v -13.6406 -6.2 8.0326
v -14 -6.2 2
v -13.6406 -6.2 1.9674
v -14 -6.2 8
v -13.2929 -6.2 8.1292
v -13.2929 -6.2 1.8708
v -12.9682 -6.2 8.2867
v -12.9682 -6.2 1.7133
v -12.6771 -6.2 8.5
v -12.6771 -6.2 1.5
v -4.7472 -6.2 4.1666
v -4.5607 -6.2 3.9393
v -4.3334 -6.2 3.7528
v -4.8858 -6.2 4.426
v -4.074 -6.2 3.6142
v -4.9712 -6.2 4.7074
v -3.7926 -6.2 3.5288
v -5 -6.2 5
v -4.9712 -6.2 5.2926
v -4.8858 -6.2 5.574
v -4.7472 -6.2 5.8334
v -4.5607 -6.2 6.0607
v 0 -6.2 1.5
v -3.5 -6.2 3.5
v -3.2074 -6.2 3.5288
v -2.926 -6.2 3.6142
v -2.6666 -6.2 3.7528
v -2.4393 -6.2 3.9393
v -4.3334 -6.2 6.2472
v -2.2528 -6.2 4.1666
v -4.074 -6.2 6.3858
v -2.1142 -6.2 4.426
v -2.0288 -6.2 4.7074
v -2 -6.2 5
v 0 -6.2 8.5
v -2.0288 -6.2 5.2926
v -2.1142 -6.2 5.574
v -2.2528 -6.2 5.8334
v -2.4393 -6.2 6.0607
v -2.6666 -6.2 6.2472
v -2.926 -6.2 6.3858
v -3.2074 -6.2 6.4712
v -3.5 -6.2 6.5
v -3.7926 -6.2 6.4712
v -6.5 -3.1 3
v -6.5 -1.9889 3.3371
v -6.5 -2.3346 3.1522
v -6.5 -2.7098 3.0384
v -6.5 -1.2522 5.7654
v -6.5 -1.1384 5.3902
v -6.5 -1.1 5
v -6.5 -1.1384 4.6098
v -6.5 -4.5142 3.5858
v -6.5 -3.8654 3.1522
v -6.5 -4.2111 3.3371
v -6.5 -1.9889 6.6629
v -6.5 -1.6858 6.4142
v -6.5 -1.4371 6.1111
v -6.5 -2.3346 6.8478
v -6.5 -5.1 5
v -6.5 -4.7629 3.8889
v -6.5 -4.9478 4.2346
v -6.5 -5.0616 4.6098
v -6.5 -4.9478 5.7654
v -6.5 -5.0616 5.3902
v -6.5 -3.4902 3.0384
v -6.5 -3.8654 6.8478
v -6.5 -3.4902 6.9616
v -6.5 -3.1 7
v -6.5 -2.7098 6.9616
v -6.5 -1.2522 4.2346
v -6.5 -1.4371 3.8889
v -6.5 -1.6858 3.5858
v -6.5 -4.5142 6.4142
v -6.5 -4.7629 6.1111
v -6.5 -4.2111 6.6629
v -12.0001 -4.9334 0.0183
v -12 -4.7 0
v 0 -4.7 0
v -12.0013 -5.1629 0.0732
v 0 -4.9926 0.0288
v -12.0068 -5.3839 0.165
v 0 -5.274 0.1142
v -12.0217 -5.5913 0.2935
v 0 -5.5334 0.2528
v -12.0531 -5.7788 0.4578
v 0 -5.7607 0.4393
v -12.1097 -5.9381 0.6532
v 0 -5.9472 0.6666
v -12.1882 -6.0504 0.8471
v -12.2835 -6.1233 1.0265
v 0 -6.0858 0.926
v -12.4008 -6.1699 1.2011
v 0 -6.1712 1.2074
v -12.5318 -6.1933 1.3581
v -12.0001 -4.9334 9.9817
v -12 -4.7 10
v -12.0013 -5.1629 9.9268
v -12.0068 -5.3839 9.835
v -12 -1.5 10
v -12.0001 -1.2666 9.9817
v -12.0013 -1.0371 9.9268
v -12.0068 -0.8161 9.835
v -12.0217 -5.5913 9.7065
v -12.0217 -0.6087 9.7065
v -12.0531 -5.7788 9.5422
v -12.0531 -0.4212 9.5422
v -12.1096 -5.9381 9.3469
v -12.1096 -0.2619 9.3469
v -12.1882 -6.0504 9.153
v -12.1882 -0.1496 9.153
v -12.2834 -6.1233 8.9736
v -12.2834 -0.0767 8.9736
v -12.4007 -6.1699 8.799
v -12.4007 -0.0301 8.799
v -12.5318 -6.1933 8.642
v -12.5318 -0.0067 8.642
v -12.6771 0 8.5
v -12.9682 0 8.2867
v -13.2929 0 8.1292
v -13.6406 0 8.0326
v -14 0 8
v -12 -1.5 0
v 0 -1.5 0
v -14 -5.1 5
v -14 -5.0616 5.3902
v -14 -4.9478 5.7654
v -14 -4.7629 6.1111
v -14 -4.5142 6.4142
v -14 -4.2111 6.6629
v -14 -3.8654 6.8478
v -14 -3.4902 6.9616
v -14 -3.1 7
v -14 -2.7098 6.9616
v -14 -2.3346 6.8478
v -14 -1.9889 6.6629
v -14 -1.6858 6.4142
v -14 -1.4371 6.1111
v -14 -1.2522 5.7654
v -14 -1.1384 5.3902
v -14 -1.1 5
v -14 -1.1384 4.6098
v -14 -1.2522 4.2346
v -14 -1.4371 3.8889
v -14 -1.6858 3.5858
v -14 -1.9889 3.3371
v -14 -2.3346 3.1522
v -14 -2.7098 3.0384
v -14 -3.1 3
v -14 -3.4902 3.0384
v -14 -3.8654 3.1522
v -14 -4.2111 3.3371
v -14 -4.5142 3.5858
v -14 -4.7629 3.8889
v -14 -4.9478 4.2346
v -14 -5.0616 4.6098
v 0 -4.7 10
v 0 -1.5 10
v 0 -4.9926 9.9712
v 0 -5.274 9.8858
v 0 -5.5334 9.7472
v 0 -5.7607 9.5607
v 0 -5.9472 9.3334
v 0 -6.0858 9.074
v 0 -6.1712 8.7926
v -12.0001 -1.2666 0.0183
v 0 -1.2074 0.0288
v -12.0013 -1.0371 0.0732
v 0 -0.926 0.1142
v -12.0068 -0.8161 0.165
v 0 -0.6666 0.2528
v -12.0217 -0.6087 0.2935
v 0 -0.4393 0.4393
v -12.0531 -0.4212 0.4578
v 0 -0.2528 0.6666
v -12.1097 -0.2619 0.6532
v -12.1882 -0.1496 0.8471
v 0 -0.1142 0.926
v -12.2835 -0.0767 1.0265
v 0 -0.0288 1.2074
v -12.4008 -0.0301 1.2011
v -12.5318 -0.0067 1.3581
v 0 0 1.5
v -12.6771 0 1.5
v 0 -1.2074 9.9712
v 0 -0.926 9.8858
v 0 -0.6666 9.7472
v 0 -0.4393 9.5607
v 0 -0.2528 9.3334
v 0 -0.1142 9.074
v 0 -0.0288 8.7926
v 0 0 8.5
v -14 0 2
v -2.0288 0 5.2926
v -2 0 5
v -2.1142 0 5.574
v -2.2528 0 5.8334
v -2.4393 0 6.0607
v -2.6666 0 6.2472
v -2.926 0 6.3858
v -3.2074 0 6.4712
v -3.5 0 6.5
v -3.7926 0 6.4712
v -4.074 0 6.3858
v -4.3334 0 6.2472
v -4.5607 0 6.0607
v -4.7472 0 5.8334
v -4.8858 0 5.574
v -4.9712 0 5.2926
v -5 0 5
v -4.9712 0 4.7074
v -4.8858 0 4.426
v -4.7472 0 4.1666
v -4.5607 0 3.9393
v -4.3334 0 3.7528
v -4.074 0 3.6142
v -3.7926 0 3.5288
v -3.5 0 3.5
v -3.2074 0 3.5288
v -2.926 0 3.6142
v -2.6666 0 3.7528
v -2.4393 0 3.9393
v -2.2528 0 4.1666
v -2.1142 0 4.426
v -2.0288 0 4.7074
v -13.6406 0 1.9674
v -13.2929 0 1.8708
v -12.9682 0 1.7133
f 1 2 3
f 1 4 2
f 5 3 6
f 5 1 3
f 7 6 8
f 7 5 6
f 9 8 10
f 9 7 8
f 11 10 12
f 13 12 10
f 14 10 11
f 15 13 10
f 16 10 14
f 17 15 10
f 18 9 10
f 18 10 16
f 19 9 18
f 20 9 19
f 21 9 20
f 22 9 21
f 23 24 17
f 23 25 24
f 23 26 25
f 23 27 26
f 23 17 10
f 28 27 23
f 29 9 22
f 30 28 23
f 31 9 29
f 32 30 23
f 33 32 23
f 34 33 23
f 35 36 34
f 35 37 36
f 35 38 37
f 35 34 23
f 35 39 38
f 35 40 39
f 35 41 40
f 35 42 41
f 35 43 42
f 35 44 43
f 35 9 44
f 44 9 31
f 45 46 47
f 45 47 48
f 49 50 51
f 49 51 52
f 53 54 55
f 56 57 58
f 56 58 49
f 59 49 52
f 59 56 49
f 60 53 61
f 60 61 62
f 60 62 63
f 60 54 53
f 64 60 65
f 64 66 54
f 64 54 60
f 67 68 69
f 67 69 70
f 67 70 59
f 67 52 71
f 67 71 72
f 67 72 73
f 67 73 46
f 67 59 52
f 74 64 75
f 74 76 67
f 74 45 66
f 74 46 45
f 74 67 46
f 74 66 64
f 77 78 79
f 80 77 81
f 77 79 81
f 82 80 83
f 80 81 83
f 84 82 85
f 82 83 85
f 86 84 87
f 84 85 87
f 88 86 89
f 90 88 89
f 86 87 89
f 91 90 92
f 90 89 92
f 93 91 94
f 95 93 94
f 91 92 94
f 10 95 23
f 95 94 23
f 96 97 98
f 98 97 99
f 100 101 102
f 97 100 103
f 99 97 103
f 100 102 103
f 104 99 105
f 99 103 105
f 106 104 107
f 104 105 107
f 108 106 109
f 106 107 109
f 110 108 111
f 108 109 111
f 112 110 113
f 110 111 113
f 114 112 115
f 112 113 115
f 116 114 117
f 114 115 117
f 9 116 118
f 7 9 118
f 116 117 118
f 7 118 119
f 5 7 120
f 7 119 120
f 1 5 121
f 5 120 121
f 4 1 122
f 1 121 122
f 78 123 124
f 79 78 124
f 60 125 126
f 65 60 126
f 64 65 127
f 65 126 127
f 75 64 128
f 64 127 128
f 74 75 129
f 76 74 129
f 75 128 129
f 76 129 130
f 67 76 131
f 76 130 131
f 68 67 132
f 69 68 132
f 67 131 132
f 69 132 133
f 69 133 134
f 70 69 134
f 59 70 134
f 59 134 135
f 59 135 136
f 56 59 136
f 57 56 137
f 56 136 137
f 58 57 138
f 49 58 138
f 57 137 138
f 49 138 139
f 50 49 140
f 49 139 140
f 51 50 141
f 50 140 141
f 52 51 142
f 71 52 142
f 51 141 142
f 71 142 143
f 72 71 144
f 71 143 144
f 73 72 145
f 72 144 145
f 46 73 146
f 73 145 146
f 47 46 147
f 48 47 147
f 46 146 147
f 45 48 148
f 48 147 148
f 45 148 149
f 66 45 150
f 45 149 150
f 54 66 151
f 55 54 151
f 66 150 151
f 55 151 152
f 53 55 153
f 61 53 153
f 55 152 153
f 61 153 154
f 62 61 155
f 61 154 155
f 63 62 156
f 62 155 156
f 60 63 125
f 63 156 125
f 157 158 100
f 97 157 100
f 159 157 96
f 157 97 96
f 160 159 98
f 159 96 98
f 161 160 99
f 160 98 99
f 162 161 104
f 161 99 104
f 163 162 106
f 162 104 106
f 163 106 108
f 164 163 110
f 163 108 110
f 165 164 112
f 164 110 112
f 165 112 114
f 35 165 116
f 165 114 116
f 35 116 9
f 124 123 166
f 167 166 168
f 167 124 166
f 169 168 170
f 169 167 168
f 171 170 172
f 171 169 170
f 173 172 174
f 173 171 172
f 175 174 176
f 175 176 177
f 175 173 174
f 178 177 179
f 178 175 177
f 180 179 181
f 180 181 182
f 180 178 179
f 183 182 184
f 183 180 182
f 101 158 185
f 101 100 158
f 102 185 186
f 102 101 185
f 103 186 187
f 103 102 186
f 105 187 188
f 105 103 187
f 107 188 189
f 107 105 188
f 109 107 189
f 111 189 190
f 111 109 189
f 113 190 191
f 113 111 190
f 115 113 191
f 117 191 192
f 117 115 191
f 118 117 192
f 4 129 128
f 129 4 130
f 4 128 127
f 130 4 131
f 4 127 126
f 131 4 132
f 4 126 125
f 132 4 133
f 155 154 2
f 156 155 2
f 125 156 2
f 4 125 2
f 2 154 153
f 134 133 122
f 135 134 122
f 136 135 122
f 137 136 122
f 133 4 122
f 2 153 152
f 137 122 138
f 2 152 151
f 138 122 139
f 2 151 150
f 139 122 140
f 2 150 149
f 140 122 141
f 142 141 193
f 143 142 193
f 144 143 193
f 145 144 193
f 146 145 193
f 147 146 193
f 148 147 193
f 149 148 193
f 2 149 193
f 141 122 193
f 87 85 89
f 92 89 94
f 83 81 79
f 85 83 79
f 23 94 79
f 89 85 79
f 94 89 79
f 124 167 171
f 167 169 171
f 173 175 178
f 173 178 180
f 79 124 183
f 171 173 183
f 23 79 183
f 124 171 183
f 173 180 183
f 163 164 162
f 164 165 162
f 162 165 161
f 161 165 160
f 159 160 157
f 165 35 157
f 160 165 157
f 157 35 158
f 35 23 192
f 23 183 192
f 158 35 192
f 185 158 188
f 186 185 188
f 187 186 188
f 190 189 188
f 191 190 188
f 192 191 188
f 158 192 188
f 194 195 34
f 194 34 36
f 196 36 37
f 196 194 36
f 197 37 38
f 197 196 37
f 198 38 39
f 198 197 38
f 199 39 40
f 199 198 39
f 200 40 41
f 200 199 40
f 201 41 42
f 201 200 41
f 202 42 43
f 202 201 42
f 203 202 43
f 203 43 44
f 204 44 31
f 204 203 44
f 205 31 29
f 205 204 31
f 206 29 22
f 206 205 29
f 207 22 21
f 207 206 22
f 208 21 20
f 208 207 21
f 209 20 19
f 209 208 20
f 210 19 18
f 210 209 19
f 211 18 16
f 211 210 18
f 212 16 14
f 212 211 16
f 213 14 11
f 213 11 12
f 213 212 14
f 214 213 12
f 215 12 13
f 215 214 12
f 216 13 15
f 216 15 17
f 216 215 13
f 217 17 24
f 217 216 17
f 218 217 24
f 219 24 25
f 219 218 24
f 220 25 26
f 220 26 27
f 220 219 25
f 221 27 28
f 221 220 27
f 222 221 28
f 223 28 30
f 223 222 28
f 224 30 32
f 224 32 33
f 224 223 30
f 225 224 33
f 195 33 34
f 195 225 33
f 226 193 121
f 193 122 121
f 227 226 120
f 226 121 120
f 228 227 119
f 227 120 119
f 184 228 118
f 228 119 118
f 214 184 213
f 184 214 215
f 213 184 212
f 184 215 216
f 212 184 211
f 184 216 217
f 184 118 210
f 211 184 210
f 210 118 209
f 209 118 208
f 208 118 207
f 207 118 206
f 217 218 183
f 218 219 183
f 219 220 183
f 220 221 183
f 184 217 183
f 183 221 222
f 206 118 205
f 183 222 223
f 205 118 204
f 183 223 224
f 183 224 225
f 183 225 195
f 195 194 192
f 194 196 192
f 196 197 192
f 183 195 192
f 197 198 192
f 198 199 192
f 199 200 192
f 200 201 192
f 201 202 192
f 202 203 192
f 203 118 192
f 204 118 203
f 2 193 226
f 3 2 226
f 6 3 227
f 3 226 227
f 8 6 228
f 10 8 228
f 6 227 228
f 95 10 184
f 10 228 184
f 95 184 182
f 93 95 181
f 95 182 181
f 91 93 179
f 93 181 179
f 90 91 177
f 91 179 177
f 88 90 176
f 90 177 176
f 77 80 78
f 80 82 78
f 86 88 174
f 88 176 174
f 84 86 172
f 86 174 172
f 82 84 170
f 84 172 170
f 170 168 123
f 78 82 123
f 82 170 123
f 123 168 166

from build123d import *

# Parameters (mm, degrees)
F0_R     = 1.5
F1_DEPTH = 6.2
F2_R     = 1.5
F3_R     = 2
F4_DEPTH = 7.5


with BuildPart() as f1:
    # F0 (on Front) → F1 (new body)
    with BuildSketch(Plane.XZ):
        with BuildLine():
            Line((-12, 0), (0, 0))
            Line((0, 0), (0, 10))
            Line((0, 10), (-12, 10))
            ThreePointArc((-12, 10), (-12.585786, 8.585786), (-14, 8))
            Line((-14, 8), (-14, 2))
            ThreePointArc((-14, 2), (-12.585786, 1.414214), (-12, 0))
        make_face()
        with Locations((-3.5, 5)):
            Circle(F0_R, mode=Mode.SUBTRACT)
    extrude(amount=F1_DEPTH)

    # F2
    f2_edges = [f1.edges().sort_by_distance(p)[0] for p in [
        (-6, -6.2, 10),
        (-6, 0, 10),
        (-6, 0, 0),
        (-6, -6.2, 0),
    ]]
    fillet(f2_edges, radius=F2_R)

    # F3 (on face) → F4 (cut)
    with BuildSketch(Plane(origin=(-14, 0, 0), x_dir=(0, -1, 0), z_dir=(-1, 0, 0))):
        with Locations((3.1, 5)):
            Circle(F3_R)
    extrude(amount=-F4_DEPTH, mode=Mode.SUBTRACT)


solid = f1.part
